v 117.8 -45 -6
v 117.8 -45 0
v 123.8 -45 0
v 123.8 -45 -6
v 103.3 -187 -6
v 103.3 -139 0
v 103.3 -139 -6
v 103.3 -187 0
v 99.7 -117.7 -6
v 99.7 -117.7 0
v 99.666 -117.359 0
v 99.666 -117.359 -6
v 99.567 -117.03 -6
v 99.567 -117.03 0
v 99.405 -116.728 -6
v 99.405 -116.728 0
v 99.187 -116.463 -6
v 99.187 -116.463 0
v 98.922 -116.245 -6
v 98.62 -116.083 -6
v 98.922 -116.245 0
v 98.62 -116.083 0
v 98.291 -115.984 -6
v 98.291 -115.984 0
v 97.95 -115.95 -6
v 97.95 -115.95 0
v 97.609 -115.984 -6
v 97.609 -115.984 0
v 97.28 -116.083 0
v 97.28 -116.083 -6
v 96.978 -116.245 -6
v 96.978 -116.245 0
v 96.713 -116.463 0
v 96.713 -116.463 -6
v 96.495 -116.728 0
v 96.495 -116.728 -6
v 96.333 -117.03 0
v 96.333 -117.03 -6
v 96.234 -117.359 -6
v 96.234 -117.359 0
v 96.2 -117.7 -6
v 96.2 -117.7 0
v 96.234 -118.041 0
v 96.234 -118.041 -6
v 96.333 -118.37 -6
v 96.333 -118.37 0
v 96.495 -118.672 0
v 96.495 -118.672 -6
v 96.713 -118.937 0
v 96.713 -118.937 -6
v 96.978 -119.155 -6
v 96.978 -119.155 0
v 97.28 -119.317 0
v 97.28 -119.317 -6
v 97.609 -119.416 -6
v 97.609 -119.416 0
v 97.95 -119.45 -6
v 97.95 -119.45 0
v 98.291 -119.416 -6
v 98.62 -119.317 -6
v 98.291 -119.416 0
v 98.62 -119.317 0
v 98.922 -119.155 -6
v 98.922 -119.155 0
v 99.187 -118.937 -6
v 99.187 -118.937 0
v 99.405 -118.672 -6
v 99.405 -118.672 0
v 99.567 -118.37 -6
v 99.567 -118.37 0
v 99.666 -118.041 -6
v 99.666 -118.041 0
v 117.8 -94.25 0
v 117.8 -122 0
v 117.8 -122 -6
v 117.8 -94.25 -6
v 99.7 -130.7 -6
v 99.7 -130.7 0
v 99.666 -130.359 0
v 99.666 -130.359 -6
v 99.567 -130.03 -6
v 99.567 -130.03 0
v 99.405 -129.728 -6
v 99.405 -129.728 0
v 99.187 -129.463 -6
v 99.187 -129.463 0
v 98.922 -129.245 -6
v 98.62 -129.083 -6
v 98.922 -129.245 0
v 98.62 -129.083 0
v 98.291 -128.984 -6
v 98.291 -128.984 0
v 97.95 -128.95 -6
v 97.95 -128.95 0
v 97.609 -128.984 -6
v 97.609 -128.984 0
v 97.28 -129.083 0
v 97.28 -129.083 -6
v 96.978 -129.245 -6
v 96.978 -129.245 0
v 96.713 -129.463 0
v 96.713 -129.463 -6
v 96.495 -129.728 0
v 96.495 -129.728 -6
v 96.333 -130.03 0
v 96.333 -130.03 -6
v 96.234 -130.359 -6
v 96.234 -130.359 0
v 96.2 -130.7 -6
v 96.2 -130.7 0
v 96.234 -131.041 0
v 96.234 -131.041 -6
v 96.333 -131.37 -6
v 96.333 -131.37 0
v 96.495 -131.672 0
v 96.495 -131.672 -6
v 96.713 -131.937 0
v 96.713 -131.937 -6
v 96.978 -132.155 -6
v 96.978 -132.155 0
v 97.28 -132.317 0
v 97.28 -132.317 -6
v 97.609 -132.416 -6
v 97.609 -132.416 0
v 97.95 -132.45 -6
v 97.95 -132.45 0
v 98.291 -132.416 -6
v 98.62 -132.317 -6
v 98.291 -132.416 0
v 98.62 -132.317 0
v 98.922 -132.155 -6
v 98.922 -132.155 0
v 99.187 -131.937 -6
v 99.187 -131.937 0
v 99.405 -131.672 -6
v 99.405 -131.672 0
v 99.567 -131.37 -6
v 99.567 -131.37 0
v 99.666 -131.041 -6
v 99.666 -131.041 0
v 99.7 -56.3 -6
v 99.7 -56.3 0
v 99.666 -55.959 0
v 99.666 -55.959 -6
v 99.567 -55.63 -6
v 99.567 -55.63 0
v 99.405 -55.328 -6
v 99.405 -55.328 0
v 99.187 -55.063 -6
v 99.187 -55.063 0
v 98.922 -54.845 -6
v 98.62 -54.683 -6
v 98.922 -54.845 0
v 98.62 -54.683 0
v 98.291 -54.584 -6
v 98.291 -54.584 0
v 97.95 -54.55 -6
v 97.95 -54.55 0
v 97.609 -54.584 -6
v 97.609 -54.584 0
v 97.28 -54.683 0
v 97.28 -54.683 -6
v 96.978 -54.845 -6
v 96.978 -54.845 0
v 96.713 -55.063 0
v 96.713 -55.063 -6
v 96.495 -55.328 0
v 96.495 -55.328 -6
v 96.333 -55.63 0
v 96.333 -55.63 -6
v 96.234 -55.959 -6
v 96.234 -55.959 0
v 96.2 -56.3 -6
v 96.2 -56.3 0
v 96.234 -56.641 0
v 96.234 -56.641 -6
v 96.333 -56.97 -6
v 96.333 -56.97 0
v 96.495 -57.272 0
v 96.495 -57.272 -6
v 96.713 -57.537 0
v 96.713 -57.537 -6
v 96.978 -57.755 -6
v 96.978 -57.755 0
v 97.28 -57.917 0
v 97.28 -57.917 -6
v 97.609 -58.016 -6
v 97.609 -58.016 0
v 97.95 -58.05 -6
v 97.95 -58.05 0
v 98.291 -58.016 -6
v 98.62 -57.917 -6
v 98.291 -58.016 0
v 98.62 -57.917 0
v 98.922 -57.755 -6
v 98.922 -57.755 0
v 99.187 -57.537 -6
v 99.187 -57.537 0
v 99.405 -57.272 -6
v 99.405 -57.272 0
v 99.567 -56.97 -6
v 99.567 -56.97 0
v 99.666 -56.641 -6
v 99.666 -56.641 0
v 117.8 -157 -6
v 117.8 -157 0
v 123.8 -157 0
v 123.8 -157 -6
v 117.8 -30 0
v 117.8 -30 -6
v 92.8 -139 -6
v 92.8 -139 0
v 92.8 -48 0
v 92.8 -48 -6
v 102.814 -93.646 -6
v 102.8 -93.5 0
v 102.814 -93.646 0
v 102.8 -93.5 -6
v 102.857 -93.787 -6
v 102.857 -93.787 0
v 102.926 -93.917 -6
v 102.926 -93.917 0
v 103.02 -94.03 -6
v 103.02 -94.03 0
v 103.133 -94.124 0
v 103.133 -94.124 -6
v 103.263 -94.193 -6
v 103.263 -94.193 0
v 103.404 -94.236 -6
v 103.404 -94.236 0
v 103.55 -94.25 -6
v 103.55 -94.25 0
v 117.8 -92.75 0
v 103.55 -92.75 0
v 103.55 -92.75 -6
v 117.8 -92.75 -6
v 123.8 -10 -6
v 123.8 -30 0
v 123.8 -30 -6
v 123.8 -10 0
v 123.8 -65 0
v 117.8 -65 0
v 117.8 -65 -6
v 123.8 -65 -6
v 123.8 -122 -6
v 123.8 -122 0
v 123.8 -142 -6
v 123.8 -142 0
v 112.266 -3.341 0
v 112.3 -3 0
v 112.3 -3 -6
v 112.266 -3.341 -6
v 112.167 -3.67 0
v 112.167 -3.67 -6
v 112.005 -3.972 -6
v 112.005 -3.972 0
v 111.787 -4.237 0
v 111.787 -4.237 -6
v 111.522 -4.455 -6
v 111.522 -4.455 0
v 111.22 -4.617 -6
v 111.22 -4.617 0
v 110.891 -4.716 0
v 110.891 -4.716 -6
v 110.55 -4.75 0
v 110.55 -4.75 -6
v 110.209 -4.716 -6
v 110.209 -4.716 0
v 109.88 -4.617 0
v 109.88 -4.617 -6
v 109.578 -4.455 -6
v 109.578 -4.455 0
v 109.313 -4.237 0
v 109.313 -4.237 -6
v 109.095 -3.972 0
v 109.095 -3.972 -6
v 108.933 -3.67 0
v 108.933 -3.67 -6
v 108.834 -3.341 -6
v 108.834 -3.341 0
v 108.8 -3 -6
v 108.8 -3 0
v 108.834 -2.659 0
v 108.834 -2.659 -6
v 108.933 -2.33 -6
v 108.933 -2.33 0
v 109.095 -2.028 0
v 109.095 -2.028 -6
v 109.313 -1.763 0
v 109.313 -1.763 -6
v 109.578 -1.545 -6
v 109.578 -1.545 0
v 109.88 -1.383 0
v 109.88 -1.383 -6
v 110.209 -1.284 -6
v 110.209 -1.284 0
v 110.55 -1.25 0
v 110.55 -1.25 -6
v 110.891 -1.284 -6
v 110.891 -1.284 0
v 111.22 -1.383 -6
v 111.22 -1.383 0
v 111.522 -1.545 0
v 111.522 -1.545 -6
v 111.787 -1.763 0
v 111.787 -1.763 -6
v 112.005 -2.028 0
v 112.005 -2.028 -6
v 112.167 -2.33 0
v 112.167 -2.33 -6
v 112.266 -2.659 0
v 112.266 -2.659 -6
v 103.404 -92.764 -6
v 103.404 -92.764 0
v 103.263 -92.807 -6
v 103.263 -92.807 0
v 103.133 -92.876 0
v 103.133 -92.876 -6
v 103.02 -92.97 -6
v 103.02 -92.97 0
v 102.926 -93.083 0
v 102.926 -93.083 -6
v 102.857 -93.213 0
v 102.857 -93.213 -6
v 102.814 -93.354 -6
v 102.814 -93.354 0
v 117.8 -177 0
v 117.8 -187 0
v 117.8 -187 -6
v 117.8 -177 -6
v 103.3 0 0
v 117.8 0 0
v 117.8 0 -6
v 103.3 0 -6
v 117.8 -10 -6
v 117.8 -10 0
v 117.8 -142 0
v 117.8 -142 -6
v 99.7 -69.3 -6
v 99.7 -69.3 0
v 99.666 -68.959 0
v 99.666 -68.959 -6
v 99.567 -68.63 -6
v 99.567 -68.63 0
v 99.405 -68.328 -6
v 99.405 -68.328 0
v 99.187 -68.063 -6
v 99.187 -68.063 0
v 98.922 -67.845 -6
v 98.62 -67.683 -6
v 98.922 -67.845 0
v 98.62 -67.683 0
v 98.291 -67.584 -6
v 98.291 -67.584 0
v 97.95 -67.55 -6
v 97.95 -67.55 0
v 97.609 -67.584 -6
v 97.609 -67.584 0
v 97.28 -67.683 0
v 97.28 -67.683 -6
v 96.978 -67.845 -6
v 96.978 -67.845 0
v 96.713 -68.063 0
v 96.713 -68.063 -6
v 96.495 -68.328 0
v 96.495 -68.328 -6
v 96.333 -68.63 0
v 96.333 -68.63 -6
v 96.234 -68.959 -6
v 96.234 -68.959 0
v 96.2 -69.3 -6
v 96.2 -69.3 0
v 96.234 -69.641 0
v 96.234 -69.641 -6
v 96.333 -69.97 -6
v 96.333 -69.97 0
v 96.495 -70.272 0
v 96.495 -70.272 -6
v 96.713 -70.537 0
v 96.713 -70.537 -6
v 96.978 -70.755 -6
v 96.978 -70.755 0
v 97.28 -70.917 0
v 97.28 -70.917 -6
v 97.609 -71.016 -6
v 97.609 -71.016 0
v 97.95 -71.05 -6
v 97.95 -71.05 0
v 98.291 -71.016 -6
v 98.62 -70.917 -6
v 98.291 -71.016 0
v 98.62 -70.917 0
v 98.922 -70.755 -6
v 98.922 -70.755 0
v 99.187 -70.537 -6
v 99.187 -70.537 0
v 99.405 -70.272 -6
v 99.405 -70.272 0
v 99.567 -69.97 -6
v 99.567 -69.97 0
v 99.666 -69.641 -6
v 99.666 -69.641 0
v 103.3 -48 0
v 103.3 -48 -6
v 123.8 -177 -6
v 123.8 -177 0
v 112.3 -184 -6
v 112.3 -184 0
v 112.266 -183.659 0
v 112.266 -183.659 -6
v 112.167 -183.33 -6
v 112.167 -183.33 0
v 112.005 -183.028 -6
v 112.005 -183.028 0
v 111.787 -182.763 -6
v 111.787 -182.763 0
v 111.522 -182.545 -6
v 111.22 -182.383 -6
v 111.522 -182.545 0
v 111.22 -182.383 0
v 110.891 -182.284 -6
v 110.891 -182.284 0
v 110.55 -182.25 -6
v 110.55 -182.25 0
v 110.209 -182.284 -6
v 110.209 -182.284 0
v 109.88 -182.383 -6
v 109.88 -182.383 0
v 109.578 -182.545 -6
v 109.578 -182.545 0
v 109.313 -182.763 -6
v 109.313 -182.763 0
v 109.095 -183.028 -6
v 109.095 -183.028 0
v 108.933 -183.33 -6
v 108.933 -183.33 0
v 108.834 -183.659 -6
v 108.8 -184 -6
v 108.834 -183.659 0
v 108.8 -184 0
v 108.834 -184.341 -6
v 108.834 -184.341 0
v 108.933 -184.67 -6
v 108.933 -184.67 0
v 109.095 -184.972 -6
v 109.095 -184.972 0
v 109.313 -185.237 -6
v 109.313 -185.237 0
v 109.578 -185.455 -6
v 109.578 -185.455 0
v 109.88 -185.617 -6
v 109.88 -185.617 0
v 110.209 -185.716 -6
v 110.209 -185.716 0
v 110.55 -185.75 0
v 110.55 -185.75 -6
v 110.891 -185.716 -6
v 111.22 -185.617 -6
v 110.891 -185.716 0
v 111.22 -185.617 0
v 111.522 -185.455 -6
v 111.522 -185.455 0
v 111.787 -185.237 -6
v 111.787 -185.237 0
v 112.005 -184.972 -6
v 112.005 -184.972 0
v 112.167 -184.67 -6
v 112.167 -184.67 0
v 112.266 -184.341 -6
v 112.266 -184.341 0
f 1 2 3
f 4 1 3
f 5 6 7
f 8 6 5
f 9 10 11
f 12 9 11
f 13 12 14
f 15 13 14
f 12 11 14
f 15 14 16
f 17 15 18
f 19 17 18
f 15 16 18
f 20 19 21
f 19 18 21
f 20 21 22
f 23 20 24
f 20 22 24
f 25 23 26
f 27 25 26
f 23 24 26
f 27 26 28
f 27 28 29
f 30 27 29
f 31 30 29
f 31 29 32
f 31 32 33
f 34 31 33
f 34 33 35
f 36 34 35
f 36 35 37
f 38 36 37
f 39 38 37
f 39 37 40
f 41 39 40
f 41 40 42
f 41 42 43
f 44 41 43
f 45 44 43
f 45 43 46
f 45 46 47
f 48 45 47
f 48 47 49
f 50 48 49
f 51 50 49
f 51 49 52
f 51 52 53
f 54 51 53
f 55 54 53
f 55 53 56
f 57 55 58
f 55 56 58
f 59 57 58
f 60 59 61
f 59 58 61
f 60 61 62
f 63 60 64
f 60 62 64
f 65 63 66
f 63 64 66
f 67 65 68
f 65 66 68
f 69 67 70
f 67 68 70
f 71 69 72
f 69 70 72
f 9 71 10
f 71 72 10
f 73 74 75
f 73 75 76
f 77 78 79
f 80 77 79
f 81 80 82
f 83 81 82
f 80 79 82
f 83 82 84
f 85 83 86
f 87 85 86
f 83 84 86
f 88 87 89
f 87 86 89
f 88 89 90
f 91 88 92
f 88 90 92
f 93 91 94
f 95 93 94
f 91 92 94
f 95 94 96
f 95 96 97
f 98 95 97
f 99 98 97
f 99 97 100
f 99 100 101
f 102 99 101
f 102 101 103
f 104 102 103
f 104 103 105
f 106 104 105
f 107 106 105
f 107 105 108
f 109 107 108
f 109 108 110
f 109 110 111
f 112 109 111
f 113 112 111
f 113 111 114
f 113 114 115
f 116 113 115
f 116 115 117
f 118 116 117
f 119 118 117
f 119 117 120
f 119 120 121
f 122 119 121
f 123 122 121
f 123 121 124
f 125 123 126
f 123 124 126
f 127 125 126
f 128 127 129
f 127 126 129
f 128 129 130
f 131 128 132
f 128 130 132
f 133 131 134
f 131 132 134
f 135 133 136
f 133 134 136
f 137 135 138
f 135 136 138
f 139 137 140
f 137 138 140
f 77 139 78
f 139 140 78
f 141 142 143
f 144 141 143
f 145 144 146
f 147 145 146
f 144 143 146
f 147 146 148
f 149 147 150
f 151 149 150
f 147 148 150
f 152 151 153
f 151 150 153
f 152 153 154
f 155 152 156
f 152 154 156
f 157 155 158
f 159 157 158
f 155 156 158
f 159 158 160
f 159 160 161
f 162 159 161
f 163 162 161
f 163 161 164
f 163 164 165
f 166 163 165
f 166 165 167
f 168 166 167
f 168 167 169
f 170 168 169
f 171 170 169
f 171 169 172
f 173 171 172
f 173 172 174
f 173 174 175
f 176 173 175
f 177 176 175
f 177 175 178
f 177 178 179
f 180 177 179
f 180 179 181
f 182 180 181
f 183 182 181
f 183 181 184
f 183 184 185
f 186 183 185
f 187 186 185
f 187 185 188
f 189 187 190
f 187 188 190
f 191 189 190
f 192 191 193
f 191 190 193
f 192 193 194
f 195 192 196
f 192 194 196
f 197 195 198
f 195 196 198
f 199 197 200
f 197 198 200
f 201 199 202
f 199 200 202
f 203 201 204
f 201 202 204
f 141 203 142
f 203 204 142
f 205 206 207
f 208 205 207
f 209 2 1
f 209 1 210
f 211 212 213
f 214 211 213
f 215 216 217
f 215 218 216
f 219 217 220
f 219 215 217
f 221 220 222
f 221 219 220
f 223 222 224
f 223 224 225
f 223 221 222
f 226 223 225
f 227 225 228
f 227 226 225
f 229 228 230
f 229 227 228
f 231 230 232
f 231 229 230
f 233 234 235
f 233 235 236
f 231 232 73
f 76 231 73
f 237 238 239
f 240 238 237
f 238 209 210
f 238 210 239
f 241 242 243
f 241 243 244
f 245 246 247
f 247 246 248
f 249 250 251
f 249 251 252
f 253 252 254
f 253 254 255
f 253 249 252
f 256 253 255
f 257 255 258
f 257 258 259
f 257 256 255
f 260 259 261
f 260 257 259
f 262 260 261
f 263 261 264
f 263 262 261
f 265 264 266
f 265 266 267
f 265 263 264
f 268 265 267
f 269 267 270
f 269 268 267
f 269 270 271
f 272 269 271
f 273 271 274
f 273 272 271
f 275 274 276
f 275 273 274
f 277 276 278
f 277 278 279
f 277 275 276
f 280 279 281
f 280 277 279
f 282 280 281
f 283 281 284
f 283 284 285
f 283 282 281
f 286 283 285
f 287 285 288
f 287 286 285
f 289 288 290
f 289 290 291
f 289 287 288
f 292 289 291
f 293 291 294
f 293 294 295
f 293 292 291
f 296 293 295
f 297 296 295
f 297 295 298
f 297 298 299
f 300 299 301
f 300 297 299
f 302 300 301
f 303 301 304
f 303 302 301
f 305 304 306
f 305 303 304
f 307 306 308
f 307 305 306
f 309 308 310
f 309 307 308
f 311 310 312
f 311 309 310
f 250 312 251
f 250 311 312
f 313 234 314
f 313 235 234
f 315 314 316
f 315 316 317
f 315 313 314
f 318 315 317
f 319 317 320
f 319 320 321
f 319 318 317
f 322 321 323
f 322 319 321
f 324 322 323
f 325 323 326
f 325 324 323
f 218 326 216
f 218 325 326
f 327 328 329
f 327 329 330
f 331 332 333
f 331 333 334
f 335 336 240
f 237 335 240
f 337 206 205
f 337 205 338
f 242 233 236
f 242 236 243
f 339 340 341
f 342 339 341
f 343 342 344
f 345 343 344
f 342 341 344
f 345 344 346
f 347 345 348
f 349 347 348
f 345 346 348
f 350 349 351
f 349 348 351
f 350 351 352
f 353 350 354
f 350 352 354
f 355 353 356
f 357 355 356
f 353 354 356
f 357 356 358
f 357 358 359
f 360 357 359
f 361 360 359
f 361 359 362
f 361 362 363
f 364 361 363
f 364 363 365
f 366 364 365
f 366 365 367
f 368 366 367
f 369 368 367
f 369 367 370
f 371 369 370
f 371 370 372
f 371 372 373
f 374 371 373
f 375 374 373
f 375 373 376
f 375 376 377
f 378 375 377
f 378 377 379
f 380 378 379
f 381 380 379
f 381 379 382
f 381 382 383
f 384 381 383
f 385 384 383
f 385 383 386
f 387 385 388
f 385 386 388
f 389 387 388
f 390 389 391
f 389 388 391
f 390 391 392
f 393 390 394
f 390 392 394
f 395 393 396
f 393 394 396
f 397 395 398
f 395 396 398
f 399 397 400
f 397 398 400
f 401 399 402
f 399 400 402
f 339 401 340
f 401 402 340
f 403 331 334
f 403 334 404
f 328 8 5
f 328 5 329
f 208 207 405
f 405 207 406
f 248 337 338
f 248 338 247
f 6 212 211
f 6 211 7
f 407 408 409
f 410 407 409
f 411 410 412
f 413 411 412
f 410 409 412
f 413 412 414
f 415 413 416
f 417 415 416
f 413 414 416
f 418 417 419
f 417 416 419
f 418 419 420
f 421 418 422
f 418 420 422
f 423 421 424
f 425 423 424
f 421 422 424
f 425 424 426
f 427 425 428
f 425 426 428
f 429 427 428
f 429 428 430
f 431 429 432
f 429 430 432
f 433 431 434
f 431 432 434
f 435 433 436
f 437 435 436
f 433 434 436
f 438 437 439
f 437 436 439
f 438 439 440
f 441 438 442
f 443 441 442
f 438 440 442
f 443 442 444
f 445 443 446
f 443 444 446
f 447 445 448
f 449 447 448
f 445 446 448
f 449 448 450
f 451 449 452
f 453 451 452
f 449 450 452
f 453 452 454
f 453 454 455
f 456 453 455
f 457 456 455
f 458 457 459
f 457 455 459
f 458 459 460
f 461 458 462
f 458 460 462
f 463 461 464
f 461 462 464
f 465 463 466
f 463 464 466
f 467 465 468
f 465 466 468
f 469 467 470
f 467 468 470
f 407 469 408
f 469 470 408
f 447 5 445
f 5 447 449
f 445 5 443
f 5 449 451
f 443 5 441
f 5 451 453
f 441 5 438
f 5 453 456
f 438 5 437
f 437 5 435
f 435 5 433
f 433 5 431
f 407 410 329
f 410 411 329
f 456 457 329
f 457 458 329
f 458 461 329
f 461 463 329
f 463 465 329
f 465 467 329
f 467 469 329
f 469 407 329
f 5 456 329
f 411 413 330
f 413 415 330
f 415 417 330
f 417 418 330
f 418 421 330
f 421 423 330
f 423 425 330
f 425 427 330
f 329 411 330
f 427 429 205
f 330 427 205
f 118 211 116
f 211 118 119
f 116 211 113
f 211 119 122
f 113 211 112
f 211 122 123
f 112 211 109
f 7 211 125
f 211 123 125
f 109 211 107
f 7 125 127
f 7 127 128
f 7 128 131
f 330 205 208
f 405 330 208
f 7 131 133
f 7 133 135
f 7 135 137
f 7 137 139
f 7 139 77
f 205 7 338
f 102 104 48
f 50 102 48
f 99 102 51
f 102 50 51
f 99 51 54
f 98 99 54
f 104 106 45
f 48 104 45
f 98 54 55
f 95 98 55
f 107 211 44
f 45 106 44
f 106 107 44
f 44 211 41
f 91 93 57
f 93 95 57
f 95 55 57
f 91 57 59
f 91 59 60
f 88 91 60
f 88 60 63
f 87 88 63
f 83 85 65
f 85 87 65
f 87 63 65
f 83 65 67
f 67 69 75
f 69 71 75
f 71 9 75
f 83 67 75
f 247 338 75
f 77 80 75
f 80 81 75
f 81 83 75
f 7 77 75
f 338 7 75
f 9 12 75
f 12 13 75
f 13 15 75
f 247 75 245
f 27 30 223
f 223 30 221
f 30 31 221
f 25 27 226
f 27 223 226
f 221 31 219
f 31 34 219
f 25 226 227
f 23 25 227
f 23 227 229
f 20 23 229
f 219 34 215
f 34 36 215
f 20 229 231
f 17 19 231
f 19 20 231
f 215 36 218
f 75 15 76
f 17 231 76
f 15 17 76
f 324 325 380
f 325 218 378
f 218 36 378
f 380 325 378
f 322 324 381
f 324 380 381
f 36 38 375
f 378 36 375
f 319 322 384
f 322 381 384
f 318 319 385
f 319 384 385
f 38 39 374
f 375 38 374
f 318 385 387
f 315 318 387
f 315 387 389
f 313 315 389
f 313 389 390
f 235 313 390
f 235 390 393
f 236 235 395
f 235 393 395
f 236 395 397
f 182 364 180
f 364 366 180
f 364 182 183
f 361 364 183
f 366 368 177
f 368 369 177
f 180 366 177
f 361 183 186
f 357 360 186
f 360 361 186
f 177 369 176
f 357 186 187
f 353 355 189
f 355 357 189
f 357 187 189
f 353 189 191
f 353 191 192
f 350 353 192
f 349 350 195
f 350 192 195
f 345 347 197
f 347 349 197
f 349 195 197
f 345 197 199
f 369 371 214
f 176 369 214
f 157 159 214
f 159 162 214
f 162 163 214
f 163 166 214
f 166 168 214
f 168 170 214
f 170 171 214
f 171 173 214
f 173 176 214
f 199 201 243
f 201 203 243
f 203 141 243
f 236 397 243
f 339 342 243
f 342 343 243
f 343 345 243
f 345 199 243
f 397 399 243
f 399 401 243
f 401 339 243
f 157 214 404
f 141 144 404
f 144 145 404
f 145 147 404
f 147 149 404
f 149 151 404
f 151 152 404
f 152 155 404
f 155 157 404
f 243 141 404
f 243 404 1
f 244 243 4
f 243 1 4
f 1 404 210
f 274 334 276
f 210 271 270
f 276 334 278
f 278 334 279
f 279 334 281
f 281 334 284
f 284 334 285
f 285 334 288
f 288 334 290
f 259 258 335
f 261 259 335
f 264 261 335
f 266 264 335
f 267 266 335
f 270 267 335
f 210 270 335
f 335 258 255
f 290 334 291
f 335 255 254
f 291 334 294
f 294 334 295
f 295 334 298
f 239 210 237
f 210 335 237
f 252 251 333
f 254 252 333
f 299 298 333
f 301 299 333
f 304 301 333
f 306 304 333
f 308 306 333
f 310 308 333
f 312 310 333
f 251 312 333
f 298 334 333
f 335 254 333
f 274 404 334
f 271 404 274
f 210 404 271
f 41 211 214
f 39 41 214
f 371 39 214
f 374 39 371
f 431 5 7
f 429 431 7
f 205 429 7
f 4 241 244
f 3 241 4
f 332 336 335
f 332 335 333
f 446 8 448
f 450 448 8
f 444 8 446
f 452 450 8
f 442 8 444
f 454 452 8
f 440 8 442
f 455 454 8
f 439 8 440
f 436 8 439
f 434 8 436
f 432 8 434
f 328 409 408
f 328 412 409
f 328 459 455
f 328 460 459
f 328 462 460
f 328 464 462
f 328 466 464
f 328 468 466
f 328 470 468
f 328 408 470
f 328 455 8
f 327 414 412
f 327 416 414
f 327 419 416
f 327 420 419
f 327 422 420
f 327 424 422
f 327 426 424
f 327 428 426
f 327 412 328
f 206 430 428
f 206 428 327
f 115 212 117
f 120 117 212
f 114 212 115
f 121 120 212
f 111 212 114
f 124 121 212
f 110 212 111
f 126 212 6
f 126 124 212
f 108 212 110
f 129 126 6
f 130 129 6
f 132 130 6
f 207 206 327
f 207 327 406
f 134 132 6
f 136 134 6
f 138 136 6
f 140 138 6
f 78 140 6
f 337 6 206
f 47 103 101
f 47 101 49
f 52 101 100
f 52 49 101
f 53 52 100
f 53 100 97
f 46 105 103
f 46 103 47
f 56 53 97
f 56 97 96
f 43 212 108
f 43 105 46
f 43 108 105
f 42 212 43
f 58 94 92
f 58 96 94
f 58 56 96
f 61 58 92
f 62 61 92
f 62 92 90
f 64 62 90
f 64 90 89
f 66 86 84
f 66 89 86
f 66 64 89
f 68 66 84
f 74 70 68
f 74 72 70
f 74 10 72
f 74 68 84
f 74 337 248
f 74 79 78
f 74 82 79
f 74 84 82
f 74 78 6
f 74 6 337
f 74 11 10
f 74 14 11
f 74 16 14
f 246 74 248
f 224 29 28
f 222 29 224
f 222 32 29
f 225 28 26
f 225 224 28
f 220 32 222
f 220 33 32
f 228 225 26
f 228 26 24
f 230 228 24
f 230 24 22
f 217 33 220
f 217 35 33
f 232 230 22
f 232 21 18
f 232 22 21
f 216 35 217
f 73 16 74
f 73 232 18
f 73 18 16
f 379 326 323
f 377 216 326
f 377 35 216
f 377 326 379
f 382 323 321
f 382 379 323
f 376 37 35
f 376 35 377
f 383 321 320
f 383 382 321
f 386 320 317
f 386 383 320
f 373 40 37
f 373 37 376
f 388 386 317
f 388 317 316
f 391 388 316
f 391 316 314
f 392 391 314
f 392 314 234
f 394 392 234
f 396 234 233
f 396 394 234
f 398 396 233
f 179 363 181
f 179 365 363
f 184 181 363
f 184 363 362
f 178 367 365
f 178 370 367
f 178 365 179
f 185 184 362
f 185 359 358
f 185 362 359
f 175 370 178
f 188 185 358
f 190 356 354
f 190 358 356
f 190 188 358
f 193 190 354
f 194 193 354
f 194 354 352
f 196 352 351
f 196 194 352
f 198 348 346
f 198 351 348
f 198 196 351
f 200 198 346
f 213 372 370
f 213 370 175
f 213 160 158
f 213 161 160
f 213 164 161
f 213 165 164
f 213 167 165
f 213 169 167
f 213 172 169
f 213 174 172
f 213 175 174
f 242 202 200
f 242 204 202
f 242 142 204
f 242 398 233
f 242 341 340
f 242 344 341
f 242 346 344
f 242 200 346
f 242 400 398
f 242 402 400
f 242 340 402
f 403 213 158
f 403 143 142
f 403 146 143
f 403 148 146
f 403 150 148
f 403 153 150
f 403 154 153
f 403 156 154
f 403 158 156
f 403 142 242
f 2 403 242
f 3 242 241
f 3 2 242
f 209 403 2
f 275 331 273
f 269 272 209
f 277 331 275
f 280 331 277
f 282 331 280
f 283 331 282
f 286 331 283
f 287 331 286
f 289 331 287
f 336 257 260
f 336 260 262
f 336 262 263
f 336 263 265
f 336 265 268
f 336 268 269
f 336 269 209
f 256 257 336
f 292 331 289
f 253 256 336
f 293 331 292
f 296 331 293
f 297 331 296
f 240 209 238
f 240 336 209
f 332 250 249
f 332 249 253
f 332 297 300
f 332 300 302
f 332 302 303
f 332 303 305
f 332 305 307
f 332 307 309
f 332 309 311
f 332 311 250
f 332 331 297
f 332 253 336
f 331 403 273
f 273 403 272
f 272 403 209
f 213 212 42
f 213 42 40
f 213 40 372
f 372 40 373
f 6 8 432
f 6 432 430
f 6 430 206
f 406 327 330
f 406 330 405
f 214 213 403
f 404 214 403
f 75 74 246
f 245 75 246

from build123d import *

# Parameters (mm, degrees)
ESBO_O1_W                = 10.5
ESBO_O1_H                = 91
RESSALTO_EXTRUS_O1_DEPTH = 6
ESBO_O2_W                = 6
ESBO_O2_H                = 20
RESSALTO_EXTRUS_O2_DEPTH = 6
ESBO_O3_R                = 1.75
CORTE_EXTRUS_O2_DEPTH    = 25.5
ESBO_O4_W                = 15
ESBO_O4_H                = 1.5
CORTE_EXTRUS_O3_DEPTH    = 6
FILETE1_R                = 0.75
ESBO_O5_R                = 1.75
CORTE_EXTRUS_O4_DEPTH    = 6


with BuildPart() as part:
    # Esboço1 → Ressalto-extrusão1 (new body)
    with BuildSketch(Plane.XY):
        with Locations((98.05, -93.5)):
            Rectangle(ESBO_O1_W, ESBO_O1_H)
        Polygon((117.8, 0), (103.3, 0), (103.3, -48), (103.3, -139), (103.3, -187), (117.8, -187), align=None)
    extrude(amount=-RESSALTO_EXTRUS_O1_DEPTH)

    # Esboço2 → Ressalto-extrusão2 (add)
    with BuildSketch(Plane.XY):
        with Locations((120.8, -20)):
            Rectangle(ESBO_O2_W, ESBO_O2_H)
        with Locations((120.8, -55)):
            Rectangle(ESBO_O2_W, ESBO_O2_H)
    ressalto_extrus_o2 = extrude(amount=-RESSALTO_EXTRUS_O2_DEPTH)

    # Espelhar1: Ressalto-extrusão2 across plane
    add(ressalto_extrus_o2.mirror(Plane.ZX.offset(-93.5)))

    # Esboço3 → Corte-extrusão2 (cut)
    with BuildSketch(Plane.XY):
        with Locations((97.95, -56.3)):
            Circle(ESBO_O3_R)
        with Locations((97.95, -69.3)):
            Circle(ESBO_O3_R)
        with Locations((97.95, -117.7)):
            Circle(ESBO_O3_R)
        with Locations((97.95, -130.7)):
            Circle(ESBO_O3_R)
    extrude(amount=-CORTE_EXTRUS_O2_DEPTH, mode=Mode.SUBTRACT)

    # Esboço4 → Corte-extrusão3 (cut)
    with BuildSketch(Plane.XY):
        with Locations((110.3, -93.5)):
            Rectangle(ESBO_O4_W, ESBO_O4_H)
    extrude(amount=-CORTE_EXTRUS_O3_DEPTH, mode=Mode.SUBTRACT)

    # Filete1
    filete1_edges = [part.edges().sort_by_distance(p)[0] for p in [
        (102.8, -94.25, -3),
        (102.8, -92.75, -3),
    ]]
    fillet(filete1_edges, radius=FILETE1_R - 0.0001)  # a hair under: the kernel refuses the full size

    # Esboço5 → Corte-extrusão4 (cut)
    with BuildSketch(Plane.XY):
        with Locations((110.55, -184)):
            Circle(ESBO_O5_R)
    corte_extrus_o4 = extrude(amount=-CORTE_EXTRUS_O4_DEPTH, mode=Mode.SUBTRACT)

    # Espelhar2: Corte-extrusão4 across plane
    add(corte_extrus_o4.mirror(Plane.ZX.offset(-93.5)), mode=Mode.SUBTRACT)


solid = part.part
